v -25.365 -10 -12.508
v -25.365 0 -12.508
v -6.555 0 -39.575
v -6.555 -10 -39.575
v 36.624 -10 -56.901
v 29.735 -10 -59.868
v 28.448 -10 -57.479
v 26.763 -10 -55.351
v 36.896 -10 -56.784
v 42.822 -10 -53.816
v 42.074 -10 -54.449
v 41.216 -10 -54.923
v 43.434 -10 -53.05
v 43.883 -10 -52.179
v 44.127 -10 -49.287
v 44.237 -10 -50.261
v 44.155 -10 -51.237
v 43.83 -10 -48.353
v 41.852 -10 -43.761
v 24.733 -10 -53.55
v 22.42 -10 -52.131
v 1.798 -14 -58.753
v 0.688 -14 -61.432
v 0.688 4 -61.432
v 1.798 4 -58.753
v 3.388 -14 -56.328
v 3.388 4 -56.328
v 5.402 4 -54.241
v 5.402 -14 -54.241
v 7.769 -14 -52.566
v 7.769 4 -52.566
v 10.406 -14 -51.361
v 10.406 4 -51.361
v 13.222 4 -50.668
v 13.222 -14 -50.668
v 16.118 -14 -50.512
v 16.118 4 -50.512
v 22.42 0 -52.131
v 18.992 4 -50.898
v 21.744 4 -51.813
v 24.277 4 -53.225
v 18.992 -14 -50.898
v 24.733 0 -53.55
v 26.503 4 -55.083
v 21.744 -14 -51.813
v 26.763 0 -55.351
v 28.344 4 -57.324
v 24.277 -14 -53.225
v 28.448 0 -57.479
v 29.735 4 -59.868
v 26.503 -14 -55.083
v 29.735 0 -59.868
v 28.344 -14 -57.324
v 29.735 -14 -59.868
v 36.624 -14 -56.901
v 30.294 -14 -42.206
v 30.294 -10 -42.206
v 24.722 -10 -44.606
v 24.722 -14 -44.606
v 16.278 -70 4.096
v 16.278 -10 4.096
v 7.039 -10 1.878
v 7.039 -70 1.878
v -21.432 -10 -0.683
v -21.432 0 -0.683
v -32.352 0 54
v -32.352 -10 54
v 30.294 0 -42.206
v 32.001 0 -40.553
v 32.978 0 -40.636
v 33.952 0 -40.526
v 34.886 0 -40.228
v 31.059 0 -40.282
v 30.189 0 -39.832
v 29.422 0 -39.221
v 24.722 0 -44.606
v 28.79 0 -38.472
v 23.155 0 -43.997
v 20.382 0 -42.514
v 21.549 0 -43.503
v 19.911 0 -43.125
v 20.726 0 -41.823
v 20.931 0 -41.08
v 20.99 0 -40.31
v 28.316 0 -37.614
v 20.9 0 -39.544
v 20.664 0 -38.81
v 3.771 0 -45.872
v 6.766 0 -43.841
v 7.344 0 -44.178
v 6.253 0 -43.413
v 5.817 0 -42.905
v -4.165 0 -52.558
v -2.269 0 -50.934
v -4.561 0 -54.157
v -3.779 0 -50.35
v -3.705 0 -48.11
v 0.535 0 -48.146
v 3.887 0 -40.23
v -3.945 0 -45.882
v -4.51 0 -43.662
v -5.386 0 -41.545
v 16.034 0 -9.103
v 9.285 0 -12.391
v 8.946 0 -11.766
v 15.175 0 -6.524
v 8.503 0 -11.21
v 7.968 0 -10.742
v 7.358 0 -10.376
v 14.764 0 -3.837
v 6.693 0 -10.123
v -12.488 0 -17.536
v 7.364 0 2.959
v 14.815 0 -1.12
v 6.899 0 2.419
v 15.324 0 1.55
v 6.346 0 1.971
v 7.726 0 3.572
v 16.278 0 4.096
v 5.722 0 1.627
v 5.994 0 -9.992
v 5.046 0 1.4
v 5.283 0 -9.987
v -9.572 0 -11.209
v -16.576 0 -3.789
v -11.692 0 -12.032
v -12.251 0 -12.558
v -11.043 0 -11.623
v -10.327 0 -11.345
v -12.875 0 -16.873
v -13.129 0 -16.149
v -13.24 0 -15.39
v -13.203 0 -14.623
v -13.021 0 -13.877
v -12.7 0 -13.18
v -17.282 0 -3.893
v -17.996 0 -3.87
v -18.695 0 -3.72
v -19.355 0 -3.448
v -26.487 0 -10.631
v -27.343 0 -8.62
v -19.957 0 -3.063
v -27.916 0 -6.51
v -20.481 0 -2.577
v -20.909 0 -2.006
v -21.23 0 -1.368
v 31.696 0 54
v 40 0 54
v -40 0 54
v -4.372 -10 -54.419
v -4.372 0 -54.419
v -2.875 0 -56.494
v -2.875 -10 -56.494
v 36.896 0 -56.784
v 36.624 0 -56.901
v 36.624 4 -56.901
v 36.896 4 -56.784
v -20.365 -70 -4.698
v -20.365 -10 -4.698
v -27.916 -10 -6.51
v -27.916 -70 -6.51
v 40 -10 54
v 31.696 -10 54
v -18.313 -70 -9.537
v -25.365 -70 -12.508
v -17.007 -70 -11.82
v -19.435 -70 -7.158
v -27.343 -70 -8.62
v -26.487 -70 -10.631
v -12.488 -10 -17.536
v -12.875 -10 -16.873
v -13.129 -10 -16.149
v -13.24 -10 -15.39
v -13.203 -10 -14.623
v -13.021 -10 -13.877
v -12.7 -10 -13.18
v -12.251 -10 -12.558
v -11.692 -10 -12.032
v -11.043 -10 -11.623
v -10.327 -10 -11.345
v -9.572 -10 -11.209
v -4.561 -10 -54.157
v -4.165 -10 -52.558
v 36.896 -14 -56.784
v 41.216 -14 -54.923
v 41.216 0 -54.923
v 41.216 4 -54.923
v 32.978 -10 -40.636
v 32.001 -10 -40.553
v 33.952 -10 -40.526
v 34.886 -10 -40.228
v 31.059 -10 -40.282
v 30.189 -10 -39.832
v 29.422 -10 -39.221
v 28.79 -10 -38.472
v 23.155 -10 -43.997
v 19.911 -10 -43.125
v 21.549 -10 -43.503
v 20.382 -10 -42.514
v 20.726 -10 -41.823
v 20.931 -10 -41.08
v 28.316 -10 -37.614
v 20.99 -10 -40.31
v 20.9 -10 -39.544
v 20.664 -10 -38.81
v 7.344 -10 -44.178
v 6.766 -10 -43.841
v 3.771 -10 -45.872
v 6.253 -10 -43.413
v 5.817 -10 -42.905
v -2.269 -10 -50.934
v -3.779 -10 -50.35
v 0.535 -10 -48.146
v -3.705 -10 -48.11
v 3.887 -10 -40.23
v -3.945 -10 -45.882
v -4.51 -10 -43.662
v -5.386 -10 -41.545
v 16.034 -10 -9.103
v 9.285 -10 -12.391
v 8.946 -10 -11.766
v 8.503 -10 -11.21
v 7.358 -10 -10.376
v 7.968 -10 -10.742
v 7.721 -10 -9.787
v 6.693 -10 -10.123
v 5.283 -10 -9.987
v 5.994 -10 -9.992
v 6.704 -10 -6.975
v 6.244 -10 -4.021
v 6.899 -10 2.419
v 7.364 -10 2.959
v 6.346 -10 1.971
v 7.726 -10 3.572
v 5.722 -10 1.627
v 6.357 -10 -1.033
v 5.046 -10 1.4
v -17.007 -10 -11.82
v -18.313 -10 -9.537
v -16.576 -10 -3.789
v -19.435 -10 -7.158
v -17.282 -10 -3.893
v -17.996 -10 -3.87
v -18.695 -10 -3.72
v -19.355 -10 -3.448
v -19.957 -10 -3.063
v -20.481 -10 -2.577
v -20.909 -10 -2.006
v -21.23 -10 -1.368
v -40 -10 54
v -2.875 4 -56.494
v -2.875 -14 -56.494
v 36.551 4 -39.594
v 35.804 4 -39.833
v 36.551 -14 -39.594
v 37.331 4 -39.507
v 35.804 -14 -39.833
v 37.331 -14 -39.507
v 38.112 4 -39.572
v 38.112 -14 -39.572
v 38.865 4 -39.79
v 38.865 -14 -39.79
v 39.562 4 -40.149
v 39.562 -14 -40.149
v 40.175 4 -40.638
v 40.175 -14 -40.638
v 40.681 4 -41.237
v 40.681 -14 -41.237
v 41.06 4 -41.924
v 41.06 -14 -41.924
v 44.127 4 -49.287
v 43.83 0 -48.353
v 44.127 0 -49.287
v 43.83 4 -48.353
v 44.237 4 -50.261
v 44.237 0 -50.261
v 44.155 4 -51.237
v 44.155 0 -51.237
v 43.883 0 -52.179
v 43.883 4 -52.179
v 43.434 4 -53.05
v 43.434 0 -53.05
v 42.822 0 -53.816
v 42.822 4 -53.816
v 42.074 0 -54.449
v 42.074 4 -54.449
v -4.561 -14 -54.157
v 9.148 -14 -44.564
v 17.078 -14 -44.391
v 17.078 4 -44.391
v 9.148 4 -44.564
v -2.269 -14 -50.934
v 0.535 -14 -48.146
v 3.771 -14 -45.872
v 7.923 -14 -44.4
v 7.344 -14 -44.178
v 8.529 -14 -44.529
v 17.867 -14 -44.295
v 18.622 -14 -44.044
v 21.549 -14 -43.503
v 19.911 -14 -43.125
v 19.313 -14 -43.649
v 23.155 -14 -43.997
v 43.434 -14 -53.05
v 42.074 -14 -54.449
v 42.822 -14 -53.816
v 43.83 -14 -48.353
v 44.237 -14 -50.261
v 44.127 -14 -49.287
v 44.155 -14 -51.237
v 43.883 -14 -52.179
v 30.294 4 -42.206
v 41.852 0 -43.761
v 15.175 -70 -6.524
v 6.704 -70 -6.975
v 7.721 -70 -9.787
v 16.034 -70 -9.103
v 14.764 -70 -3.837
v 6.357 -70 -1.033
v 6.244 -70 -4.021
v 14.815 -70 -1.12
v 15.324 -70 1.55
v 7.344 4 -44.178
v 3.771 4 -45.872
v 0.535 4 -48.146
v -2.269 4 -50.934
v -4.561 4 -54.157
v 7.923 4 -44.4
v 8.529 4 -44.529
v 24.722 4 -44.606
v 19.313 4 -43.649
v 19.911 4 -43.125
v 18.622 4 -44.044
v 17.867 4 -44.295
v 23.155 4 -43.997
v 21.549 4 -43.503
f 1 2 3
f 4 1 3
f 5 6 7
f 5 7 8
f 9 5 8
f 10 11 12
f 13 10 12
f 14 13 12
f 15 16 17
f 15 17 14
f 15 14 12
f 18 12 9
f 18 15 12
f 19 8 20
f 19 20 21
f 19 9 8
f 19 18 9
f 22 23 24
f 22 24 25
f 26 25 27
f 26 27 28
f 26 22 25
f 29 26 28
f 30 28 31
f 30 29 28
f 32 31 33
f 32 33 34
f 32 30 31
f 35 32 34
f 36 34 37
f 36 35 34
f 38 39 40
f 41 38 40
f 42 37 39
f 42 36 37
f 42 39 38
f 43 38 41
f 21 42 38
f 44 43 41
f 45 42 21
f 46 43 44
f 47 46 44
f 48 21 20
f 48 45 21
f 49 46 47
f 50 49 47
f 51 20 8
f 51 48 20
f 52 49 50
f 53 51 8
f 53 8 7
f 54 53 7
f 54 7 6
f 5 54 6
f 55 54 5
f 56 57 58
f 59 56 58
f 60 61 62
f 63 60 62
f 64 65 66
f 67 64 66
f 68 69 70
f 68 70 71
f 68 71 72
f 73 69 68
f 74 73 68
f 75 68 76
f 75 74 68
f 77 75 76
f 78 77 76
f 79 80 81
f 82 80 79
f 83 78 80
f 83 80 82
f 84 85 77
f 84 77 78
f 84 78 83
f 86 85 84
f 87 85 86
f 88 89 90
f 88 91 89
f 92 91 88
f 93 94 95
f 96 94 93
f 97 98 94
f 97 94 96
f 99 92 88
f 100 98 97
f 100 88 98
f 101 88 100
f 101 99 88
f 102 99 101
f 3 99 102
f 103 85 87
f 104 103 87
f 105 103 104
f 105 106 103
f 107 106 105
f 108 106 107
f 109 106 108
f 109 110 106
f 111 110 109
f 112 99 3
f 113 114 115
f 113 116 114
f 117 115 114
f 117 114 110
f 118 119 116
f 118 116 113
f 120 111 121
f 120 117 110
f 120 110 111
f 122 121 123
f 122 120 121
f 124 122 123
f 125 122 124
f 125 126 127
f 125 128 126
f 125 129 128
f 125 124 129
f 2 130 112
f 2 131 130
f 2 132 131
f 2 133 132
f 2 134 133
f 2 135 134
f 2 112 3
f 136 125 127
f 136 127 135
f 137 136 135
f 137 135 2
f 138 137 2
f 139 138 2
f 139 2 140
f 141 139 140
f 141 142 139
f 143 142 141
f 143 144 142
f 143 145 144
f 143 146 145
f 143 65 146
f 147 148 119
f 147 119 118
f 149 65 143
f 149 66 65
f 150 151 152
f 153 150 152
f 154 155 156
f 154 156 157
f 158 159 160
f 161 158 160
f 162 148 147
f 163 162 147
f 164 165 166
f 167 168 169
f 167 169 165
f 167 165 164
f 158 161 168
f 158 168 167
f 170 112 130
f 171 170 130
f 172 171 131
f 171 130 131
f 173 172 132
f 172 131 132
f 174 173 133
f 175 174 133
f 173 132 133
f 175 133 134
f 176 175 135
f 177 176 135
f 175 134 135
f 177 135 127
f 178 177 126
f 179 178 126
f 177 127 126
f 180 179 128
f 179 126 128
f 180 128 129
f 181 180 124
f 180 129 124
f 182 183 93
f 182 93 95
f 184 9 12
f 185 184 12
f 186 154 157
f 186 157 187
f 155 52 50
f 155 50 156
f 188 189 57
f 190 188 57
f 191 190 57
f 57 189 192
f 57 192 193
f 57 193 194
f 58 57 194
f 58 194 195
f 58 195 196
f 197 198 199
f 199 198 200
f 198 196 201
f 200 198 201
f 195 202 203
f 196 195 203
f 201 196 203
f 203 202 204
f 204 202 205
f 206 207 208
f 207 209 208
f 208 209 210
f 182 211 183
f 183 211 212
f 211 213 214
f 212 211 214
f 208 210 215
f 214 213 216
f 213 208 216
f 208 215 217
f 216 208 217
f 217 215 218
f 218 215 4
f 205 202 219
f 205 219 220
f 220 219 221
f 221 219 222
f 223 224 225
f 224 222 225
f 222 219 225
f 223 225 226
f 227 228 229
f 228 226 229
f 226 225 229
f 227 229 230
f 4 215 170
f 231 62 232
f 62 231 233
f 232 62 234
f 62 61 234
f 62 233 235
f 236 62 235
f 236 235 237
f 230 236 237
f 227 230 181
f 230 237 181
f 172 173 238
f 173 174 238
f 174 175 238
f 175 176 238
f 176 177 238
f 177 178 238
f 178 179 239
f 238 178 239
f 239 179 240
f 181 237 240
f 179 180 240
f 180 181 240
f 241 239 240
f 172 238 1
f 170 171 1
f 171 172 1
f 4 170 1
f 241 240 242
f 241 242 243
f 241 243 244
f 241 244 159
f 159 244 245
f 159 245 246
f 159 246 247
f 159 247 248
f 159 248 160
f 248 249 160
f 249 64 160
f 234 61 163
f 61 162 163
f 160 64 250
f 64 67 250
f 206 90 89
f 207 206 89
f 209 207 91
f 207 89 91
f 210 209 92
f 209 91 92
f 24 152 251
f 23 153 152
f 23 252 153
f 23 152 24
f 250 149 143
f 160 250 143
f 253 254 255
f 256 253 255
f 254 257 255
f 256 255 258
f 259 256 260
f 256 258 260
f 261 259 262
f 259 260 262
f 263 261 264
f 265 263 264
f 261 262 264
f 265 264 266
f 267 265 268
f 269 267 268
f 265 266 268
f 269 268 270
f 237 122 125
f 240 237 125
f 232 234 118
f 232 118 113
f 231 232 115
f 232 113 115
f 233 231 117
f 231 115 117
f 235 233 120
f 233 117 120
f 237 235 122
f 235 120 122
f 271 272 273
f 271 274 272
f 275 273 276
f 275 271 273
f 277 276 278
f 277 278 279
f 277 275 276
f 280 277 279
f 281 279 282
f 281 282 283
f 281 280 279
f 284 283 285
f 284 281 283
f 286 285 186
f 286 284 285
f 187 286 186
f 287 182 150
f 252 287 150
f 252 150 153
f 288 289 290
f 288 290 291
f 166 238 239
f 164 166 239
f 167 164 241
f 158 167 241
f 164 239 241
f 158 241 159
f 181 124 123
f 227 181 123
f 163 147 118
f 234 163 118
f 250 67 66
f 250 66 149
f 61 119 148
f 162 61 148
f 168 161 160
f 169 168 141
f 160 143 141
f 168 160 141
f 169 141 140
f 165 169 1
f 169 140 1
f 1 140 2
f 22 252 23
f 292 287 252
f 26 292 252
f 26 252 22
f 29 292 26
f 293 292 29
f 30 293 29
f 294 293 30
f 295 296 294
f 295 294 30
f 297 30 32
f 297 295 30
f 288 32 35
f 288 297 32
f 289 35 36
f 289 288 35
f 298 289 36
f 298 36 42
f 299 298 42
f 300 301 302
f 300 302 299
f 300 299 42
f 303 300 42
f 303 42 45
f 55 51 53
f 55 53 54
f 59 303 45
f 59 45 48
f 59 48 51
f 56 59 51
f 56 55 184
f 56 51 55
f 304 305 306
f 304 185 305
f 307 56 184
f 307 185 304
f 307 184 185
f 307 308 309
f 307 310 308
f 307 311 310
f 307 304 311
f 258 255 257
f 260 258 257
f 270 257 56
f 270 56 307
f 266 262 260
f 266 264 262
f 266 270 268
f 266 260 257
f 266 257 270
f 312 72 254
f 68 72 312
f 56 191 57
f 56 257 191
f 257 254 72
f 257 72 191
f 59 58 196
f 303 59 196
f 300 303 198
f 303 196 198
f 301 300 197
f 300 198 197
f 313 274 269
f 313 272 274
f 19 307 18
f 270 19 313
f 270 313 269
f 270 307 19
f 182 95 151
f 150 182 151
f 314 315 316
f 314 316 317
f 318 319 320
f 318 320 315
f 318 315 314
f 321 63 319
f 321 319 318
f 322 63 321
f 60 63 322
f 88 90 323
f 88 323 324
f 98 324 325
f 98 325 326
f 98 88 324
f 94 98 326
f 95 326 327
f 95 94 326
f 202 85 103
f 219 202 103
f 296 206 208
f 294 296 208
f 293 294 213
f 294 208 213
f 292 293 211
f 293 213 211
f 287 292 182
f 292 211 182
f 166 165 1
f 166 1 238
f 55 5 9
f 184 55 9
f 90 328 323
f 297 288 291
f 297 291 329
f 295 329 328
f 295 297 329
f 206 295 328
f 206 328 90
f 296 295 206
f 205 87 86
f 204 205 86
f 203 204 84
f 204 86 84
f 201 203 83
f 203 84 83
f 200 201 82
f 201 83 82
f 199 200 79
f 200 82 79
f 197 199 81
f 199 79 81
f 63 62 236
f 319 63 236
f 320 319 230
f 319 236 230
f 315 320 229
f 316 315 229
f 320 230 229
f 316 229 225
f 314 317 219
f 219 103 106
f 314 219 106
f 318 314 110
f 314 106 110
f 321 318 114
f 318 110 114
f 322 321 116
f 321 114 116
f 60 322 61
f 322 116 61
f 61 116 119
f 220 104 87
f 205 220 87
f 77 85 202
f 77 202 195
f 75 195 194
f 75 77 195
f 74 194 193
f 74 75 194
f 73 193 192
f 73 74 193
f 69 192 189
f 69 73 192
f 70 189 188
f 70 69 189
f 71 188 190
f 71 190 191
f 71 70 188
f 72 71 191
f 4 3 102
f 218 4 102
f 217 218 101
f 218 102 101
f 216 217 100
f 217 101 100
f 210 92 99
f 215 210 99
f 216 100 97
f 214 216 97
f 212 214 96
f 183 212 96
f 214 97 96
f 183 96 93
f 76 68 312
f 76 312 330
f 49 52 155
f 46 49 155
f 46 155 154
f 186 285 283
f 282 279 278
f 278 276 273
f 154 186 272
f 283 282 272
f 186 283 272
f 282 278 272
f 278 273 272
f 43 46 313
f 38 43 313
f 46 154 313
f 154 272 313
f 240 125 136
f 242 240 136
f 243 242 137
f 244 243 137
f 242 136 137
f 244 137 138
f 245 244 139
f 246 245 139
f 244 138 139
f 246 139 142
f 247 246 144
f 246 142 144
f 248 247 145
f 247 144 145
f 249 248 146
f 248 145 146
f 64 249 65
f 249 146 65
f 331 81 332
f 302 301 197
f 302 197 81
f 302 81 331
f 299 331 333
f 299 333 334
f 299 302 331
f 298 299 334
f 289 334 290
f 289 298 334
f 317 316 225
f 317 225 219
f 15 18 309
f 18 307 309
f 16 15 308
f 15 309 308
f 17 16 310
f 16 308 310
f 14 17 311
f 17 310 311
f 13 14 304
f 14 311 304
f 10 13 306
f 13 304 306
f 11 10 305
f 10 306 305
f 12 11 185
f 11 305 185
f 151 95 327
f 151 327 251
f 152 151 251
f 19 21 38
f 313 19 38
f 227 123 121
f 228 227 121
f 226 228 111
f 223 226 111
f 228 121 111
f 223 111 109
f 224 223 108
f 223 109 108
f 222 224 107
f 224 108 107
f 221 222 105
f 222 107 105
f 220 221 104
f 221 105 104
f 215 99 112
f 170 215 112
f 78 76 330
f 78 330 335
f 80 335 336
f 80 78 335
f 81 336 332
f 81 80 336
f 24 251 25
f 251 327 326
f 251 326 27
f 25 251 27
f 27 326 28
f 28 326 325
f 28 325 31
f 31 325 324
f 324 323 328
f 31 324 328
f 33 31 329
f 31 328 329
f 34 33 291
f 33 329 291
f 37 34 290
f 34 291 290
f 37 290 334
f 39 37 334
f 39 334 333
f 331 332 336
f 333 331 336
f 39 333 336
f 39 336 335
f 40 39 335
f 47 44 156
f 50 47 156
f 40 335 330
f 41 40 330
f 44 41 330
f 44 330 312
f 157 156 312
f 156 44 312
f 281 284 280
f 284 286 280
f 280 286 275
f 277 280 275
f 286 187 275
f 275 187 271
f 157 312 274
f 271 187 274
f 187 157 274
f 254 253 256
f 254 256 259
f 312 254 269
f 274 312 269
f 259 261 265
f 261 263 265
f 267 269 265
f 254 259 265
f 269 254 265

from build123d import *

# Parameters (mm, degrees)
F1_DEPTH      = 10
F3_DEPTH      = 4
F3_DEPTH_BACK = 14
F4_W          = 10
F4_H          = 10
F5_DEPTH      = 25
F6_T1_DEPTH   = 10
F7_R          = 4
F8_R          = 5
F10_DEPTH     = 60


# Not quite as in the source:
# - a fillet or chamfer that OpenCascade refuses, or shapes differently, is made with other operations: its cross-section is extruded or revolved along the edge and cut away or added
# - a feature names something its author has since deleted; it is built from what else it names


with BuildPart() as f1:
    # F0 (on Front) → F1 (new body)
    with BuildSketch(Plane.XZ):
        with BuildLine():
            ThreePointArc((19.6522871604, -43.3779198274), (22.0356929141, -43.9481357221), (24.344898549, -44.7687077723))
            Line((24.344898549, -44.7687077723), (30.2937477303, -42.2061976958))
            Line((30.2937477303, -42.2061976958), (16.0343749186, -9.1031636608))
            ThreePointArc((16.0343749186, -9.1031636608), (14.7317766807, -2.4774455359), (16.2784975378, 4.0955718405))
            Line((16.2784975378, 4.0955718405), (40, 54))
            Line((40, 54), (31.6958138155, 54))
            Line((31.6958138155, 54), (7.7256415471, 3.5724294089))
            ThreePointArc((7.7256415471, 3.5724294089), (6.6322171557, 2.1826346144), (5.0464276278, 1.4000887411))
            Line((5.0464276278, 1.4000887411), (-16.5758134292, -3.788837771))
            ThreePointArc((-16.5758134292, -3.788837771), (-19.6646678264, -3.268857876), (-21.4317839616, -0.6826055404))
            Line((-21.4317839616, -0.6826055404), (-32.3519113749, 54))
            Line((-32.3519113749, 54), (-40, 54))
            Line((-40, 54), (-27.9160834498, -6.5102868387))
            ThreePointArc((-27.9160834498, -6.5102868387), (-26.9490490541, -9.6402216111), (-25.3648124606, -12.5075969995))
            Line((-25.3648124606, -12.5075969995), (-6.5550611463, -39.5746751924))
            ThreePointArc((-6.5550611463, -39.5746751924), (-4.9098360692, -42.5874005907), (-3.945102256, -45.8817242769))
            Line((-3.945102256, -45.8817242769), (3.8871387568, -40.2303608977))
            Line((3.8871387568, -40.2303608977), (-12.4880276922, -17.5359698901))
            ThreePointArc((-12.4880276922, -17.5359698901), (-12.8770477363, -13.5212266501), (-9.5721086698, -11.2088950032))
            Line((-9.5721086698, -11.2088950032), (5.2830699548, -9.987289736))
            ThreePointArc((5.2830699548, -9.987289736), (7.6708908871, -10.5450664651), (9.284566981, -12.3913744428))
            Line((9.284566981, -12.3913744428), (20.6643672802, -38.8095010734))
            ThreePointArc((20.6643672802, -38.8095010734), (20.8960138101, -41.2571363473), (19.6522871604, -43.3779198274))
        make_face()
        with BuildLine():
            Line((-4.3718418374, -54.4194170272), (-2.8750095458, -56.4938812719))
            Line((-2.8750095458, -56.4938812719), (24.344898549, -44.7687077723))
            ThreePointArc((24.344898549, -44.7687077723), (22.0356929141, -43.9481357221), (19.6522871604, -43.3779198274))
            ThreePointArc((19.6522871604, -43.3779198274), (18.4554525804, -44.1141232898), (17.0778668556, -44.3910097661))
            Line((17.0778668556, -44.3910097661), (9.1481831441, -44.5638505003))
            ThreePointArc((9.1481831441, -44.5638505003), (8.440161238, -44.5163238476), (7.7516789791, -44.3444344023))
            ThreePointArc((7.7516789791, -44.3444344023), (0.7998412321, -48.3108696597), (-4.3718418374, -54.4194170272))
        make_face()
        with BuildLine():
            Line((-4.5614236042, -54.156675103), (-4.3718418374, -54.4194170272))
            ThreePointArc((-4.3718418374, -54.4194170272), (0.7998412321, -48.3108696597), (7.7516789791, -44.3444344023))
            ThreePointArc((7.7516789791, -44.3444344023), (6.6734648322, -43.7740983951), (5.81726752, -42.9053319878))
            Line((5.81726752, -42.9053319878), (3.8871387568, -40.2303608977))
            Line((3.8871387568, -40.2303608977), (-3.945102256, -45.8817242769))
            ThreePointArc((-3.945102256, -45.8817242769), (-3.7026448472, -49.2316692283), (-4.1648631271, -52.5584200507))
            Line((-4.1648631271, -52.5584200507), (-4.5614236042, -54.156675103))
        make_face()
        Polygon((30.2937477303, -42.2061976958), (36.6235819074, -56.9008633705), (45.807747954, -52.9447170098), (39.477913777, -38.2500513351), align=None)
        with BuildLine():
            ThreePointArc((24.344898549, -44.7687077723), (31.6655422142, -49.6392162498), (36.6235819074, -56.9008633705))
            Line((36.6235819074, -56.9008633705), (30.2937477303, -42.2061976958))
            Line((30.2937477303, -42.2061976958), (24.344898549, -44.7687077723))
        make_face()
    extrude(amount=F1_DEPTH)

    # F2 (on face) → F3 (join, two sides)
    with BuildSketch(Plane.XZ.offset(10)) as f3_sk:
        with BuildLine():
            Line((45.807747954, -52.9447170098), (39.477913777, -38.2500513351))
            Line((39.477913777, -38.2500513351), (30.2937477303, -42.2061976958))
            Line((30.2937477303, -42.2061976958), (24.721675481, -44.6064083669))
            ThreePointArc((24.721675481, -44.6064083669), (31.9751079214, -49.5289380846), (36.8958559524, -56.7835793441))
            Line((36.8958559524, -56.7835793441), (45.807747954, -52.9447170098))
        make_face()
        with BuildLine():
            Line((36.6235819074, -56.9008633705), (36.8958559524, -56.7835793441))
            ThreePointArc((36.8958559524, -56.7835793441), (31.9751079214, -49.5289380846), (24.721675481, -44.6064083669))
            ThreePointArc((24.721675481, -44.6064083669), (22.3566538827, -43.7354236695), (19.9113834301, -43.1250189536))
            ThreePointArc((19.9113834301, -43.1250189536), (18.6224089936, -44.0440177459), (17.0778668556, -44.3910097661))
            Line((17.0778668556, -44.3910097661), (9.1481831441, -44.5638505003))
            ThreePointArc((9.1481831441, -44.5638505003), (8.2237355637, -44.4761887941), (7.3444115948, -44.177730654))
            ThreePointArc((7.3444115948, -44.177730654), (0.5352155123, -48.1455807465), (-4.5614236042, -54.156675103))
            Line((-4.5614236042, -54.156675103), (-2.8750095458, -56.4938812719))
            Line((-2.8750095458, -56.4938812719), (24.344898549, -44.7687077723))
            ThreePointArc((24.344898549, -44.7687077723), (31.6655422142, -49.6392162498), (36.6235819074, -56.9008633705))
        make_face()
        with BuildLine():
            Line((29.7354573724, -59.867973141), (36.6235819074, -56.9008633705))
            ThreePointArc((36.6235819074, -56.9008633705), (31.6655422142, -49.6392162498), (24.344898549, -44.7687077723))
            Line((24.344898549, -44.7687077723), (-2.8750095458, -56.4938812719))
            Line((-2.8750095458, -56.4938812719), (0.6883118522, -61.4322988045))
            ThreePointArc((0.6883118522, -61.4322988045), (14.6664598558, -50.5224287814), (29.7354573724, -59.867973141))
        make_face()
    extrude(amount=F3_DEPTH)
    extrude(f3_sk.sketch, amount=-F3_DEPTH_BACK)

    # F4 (on face) → F5 (cut)
    with BuildSketch(Plane(origin=(19.4014510262, 0, 8.35731622), x_dir=(0, 1, 0), z_dir=(0.9184166047, 0, 0.3956146361))):
        with Locations((-5, -61.7475227671)):
            Rectangle(F4_W, F4_H)
    extrude(amount=-F5_DEPTH, mode=Mode.SUBTRACT)

    # F6: fillet of radius 5 on 1 edges, made by hand

    # F6_s2 → F6_t1 (join)
    with BuildSketch(Plane.XZ):
        with BuildLine():
            ThreePointArc((28.31567455, -37.6141146724), (31.0593734872, -40.2818434972), (34.8858307536, -40.2281245155))
            Line((34.8858307536, -40.2281245155), (30.2937477303, -42.2061976958))
            Line((30.2937477303, -42.2061976958), (28.31567455, -37.6141146724))
        make_face()
    extrude(amount=F6_T1_DEPTH)

    # F7
    f7_edges = [f1.edges().sort_by_distance(p)[0] for p in [
        (39.477914, -5, -38.250051),
    ]]
    fillet(f7_edges, radius=F7_R)

    # F8
    f8_edges = [f1.edges().sort_by_distance(p)[0] for p in [
        (45.807748, -12, -52.944717),
        (45.807748, 2, -52.944717),
    ]]
    fillet(f8_edges, radius=F8_R)

    # F9 (on face) → F10 (join)
    with BuildSketch(Plane.XZ.offset(10)):
        with BuildLine():
            ThreePointArc((-17.0067008, -11.8202735087), (-18.8974369177, -8.3589640964), (-20.3653347512, -4.6982507964))
            Line((-20.3653347512, -4.6982507964), (-27.9160834498, -6.5102868387))
            ThreePointArc((-27.9160834498, -6.5102868387), (-26.9490490541, -9.6402216111), (-25.3648124606, -12.5075969995))
            Line((-25.3648124606, -12.5075969995), (-17.0067008, -11.8202735087))
        make_face()
        with BuildLine():
            Line((16.2784975378, 4.0955718405), (7.0391568902, 1.8783058544))
            ThreePointArc((7.0391568902, 1.8783058544), (6.2442508473, -4.0206259595), (7.72081337, -9.7868236042))
            Line((7.72081337, -9.7868236042), (16.0343749186, -9.1031636608))
            ThreePointArc((16.0343749186, -9.1031636608), (14.7317766807, -2.4774455359), (16.2784975378, 4.0955718405))
        make_face()
    extrude(amount=F10_DEPTH)


solid = f1.part
